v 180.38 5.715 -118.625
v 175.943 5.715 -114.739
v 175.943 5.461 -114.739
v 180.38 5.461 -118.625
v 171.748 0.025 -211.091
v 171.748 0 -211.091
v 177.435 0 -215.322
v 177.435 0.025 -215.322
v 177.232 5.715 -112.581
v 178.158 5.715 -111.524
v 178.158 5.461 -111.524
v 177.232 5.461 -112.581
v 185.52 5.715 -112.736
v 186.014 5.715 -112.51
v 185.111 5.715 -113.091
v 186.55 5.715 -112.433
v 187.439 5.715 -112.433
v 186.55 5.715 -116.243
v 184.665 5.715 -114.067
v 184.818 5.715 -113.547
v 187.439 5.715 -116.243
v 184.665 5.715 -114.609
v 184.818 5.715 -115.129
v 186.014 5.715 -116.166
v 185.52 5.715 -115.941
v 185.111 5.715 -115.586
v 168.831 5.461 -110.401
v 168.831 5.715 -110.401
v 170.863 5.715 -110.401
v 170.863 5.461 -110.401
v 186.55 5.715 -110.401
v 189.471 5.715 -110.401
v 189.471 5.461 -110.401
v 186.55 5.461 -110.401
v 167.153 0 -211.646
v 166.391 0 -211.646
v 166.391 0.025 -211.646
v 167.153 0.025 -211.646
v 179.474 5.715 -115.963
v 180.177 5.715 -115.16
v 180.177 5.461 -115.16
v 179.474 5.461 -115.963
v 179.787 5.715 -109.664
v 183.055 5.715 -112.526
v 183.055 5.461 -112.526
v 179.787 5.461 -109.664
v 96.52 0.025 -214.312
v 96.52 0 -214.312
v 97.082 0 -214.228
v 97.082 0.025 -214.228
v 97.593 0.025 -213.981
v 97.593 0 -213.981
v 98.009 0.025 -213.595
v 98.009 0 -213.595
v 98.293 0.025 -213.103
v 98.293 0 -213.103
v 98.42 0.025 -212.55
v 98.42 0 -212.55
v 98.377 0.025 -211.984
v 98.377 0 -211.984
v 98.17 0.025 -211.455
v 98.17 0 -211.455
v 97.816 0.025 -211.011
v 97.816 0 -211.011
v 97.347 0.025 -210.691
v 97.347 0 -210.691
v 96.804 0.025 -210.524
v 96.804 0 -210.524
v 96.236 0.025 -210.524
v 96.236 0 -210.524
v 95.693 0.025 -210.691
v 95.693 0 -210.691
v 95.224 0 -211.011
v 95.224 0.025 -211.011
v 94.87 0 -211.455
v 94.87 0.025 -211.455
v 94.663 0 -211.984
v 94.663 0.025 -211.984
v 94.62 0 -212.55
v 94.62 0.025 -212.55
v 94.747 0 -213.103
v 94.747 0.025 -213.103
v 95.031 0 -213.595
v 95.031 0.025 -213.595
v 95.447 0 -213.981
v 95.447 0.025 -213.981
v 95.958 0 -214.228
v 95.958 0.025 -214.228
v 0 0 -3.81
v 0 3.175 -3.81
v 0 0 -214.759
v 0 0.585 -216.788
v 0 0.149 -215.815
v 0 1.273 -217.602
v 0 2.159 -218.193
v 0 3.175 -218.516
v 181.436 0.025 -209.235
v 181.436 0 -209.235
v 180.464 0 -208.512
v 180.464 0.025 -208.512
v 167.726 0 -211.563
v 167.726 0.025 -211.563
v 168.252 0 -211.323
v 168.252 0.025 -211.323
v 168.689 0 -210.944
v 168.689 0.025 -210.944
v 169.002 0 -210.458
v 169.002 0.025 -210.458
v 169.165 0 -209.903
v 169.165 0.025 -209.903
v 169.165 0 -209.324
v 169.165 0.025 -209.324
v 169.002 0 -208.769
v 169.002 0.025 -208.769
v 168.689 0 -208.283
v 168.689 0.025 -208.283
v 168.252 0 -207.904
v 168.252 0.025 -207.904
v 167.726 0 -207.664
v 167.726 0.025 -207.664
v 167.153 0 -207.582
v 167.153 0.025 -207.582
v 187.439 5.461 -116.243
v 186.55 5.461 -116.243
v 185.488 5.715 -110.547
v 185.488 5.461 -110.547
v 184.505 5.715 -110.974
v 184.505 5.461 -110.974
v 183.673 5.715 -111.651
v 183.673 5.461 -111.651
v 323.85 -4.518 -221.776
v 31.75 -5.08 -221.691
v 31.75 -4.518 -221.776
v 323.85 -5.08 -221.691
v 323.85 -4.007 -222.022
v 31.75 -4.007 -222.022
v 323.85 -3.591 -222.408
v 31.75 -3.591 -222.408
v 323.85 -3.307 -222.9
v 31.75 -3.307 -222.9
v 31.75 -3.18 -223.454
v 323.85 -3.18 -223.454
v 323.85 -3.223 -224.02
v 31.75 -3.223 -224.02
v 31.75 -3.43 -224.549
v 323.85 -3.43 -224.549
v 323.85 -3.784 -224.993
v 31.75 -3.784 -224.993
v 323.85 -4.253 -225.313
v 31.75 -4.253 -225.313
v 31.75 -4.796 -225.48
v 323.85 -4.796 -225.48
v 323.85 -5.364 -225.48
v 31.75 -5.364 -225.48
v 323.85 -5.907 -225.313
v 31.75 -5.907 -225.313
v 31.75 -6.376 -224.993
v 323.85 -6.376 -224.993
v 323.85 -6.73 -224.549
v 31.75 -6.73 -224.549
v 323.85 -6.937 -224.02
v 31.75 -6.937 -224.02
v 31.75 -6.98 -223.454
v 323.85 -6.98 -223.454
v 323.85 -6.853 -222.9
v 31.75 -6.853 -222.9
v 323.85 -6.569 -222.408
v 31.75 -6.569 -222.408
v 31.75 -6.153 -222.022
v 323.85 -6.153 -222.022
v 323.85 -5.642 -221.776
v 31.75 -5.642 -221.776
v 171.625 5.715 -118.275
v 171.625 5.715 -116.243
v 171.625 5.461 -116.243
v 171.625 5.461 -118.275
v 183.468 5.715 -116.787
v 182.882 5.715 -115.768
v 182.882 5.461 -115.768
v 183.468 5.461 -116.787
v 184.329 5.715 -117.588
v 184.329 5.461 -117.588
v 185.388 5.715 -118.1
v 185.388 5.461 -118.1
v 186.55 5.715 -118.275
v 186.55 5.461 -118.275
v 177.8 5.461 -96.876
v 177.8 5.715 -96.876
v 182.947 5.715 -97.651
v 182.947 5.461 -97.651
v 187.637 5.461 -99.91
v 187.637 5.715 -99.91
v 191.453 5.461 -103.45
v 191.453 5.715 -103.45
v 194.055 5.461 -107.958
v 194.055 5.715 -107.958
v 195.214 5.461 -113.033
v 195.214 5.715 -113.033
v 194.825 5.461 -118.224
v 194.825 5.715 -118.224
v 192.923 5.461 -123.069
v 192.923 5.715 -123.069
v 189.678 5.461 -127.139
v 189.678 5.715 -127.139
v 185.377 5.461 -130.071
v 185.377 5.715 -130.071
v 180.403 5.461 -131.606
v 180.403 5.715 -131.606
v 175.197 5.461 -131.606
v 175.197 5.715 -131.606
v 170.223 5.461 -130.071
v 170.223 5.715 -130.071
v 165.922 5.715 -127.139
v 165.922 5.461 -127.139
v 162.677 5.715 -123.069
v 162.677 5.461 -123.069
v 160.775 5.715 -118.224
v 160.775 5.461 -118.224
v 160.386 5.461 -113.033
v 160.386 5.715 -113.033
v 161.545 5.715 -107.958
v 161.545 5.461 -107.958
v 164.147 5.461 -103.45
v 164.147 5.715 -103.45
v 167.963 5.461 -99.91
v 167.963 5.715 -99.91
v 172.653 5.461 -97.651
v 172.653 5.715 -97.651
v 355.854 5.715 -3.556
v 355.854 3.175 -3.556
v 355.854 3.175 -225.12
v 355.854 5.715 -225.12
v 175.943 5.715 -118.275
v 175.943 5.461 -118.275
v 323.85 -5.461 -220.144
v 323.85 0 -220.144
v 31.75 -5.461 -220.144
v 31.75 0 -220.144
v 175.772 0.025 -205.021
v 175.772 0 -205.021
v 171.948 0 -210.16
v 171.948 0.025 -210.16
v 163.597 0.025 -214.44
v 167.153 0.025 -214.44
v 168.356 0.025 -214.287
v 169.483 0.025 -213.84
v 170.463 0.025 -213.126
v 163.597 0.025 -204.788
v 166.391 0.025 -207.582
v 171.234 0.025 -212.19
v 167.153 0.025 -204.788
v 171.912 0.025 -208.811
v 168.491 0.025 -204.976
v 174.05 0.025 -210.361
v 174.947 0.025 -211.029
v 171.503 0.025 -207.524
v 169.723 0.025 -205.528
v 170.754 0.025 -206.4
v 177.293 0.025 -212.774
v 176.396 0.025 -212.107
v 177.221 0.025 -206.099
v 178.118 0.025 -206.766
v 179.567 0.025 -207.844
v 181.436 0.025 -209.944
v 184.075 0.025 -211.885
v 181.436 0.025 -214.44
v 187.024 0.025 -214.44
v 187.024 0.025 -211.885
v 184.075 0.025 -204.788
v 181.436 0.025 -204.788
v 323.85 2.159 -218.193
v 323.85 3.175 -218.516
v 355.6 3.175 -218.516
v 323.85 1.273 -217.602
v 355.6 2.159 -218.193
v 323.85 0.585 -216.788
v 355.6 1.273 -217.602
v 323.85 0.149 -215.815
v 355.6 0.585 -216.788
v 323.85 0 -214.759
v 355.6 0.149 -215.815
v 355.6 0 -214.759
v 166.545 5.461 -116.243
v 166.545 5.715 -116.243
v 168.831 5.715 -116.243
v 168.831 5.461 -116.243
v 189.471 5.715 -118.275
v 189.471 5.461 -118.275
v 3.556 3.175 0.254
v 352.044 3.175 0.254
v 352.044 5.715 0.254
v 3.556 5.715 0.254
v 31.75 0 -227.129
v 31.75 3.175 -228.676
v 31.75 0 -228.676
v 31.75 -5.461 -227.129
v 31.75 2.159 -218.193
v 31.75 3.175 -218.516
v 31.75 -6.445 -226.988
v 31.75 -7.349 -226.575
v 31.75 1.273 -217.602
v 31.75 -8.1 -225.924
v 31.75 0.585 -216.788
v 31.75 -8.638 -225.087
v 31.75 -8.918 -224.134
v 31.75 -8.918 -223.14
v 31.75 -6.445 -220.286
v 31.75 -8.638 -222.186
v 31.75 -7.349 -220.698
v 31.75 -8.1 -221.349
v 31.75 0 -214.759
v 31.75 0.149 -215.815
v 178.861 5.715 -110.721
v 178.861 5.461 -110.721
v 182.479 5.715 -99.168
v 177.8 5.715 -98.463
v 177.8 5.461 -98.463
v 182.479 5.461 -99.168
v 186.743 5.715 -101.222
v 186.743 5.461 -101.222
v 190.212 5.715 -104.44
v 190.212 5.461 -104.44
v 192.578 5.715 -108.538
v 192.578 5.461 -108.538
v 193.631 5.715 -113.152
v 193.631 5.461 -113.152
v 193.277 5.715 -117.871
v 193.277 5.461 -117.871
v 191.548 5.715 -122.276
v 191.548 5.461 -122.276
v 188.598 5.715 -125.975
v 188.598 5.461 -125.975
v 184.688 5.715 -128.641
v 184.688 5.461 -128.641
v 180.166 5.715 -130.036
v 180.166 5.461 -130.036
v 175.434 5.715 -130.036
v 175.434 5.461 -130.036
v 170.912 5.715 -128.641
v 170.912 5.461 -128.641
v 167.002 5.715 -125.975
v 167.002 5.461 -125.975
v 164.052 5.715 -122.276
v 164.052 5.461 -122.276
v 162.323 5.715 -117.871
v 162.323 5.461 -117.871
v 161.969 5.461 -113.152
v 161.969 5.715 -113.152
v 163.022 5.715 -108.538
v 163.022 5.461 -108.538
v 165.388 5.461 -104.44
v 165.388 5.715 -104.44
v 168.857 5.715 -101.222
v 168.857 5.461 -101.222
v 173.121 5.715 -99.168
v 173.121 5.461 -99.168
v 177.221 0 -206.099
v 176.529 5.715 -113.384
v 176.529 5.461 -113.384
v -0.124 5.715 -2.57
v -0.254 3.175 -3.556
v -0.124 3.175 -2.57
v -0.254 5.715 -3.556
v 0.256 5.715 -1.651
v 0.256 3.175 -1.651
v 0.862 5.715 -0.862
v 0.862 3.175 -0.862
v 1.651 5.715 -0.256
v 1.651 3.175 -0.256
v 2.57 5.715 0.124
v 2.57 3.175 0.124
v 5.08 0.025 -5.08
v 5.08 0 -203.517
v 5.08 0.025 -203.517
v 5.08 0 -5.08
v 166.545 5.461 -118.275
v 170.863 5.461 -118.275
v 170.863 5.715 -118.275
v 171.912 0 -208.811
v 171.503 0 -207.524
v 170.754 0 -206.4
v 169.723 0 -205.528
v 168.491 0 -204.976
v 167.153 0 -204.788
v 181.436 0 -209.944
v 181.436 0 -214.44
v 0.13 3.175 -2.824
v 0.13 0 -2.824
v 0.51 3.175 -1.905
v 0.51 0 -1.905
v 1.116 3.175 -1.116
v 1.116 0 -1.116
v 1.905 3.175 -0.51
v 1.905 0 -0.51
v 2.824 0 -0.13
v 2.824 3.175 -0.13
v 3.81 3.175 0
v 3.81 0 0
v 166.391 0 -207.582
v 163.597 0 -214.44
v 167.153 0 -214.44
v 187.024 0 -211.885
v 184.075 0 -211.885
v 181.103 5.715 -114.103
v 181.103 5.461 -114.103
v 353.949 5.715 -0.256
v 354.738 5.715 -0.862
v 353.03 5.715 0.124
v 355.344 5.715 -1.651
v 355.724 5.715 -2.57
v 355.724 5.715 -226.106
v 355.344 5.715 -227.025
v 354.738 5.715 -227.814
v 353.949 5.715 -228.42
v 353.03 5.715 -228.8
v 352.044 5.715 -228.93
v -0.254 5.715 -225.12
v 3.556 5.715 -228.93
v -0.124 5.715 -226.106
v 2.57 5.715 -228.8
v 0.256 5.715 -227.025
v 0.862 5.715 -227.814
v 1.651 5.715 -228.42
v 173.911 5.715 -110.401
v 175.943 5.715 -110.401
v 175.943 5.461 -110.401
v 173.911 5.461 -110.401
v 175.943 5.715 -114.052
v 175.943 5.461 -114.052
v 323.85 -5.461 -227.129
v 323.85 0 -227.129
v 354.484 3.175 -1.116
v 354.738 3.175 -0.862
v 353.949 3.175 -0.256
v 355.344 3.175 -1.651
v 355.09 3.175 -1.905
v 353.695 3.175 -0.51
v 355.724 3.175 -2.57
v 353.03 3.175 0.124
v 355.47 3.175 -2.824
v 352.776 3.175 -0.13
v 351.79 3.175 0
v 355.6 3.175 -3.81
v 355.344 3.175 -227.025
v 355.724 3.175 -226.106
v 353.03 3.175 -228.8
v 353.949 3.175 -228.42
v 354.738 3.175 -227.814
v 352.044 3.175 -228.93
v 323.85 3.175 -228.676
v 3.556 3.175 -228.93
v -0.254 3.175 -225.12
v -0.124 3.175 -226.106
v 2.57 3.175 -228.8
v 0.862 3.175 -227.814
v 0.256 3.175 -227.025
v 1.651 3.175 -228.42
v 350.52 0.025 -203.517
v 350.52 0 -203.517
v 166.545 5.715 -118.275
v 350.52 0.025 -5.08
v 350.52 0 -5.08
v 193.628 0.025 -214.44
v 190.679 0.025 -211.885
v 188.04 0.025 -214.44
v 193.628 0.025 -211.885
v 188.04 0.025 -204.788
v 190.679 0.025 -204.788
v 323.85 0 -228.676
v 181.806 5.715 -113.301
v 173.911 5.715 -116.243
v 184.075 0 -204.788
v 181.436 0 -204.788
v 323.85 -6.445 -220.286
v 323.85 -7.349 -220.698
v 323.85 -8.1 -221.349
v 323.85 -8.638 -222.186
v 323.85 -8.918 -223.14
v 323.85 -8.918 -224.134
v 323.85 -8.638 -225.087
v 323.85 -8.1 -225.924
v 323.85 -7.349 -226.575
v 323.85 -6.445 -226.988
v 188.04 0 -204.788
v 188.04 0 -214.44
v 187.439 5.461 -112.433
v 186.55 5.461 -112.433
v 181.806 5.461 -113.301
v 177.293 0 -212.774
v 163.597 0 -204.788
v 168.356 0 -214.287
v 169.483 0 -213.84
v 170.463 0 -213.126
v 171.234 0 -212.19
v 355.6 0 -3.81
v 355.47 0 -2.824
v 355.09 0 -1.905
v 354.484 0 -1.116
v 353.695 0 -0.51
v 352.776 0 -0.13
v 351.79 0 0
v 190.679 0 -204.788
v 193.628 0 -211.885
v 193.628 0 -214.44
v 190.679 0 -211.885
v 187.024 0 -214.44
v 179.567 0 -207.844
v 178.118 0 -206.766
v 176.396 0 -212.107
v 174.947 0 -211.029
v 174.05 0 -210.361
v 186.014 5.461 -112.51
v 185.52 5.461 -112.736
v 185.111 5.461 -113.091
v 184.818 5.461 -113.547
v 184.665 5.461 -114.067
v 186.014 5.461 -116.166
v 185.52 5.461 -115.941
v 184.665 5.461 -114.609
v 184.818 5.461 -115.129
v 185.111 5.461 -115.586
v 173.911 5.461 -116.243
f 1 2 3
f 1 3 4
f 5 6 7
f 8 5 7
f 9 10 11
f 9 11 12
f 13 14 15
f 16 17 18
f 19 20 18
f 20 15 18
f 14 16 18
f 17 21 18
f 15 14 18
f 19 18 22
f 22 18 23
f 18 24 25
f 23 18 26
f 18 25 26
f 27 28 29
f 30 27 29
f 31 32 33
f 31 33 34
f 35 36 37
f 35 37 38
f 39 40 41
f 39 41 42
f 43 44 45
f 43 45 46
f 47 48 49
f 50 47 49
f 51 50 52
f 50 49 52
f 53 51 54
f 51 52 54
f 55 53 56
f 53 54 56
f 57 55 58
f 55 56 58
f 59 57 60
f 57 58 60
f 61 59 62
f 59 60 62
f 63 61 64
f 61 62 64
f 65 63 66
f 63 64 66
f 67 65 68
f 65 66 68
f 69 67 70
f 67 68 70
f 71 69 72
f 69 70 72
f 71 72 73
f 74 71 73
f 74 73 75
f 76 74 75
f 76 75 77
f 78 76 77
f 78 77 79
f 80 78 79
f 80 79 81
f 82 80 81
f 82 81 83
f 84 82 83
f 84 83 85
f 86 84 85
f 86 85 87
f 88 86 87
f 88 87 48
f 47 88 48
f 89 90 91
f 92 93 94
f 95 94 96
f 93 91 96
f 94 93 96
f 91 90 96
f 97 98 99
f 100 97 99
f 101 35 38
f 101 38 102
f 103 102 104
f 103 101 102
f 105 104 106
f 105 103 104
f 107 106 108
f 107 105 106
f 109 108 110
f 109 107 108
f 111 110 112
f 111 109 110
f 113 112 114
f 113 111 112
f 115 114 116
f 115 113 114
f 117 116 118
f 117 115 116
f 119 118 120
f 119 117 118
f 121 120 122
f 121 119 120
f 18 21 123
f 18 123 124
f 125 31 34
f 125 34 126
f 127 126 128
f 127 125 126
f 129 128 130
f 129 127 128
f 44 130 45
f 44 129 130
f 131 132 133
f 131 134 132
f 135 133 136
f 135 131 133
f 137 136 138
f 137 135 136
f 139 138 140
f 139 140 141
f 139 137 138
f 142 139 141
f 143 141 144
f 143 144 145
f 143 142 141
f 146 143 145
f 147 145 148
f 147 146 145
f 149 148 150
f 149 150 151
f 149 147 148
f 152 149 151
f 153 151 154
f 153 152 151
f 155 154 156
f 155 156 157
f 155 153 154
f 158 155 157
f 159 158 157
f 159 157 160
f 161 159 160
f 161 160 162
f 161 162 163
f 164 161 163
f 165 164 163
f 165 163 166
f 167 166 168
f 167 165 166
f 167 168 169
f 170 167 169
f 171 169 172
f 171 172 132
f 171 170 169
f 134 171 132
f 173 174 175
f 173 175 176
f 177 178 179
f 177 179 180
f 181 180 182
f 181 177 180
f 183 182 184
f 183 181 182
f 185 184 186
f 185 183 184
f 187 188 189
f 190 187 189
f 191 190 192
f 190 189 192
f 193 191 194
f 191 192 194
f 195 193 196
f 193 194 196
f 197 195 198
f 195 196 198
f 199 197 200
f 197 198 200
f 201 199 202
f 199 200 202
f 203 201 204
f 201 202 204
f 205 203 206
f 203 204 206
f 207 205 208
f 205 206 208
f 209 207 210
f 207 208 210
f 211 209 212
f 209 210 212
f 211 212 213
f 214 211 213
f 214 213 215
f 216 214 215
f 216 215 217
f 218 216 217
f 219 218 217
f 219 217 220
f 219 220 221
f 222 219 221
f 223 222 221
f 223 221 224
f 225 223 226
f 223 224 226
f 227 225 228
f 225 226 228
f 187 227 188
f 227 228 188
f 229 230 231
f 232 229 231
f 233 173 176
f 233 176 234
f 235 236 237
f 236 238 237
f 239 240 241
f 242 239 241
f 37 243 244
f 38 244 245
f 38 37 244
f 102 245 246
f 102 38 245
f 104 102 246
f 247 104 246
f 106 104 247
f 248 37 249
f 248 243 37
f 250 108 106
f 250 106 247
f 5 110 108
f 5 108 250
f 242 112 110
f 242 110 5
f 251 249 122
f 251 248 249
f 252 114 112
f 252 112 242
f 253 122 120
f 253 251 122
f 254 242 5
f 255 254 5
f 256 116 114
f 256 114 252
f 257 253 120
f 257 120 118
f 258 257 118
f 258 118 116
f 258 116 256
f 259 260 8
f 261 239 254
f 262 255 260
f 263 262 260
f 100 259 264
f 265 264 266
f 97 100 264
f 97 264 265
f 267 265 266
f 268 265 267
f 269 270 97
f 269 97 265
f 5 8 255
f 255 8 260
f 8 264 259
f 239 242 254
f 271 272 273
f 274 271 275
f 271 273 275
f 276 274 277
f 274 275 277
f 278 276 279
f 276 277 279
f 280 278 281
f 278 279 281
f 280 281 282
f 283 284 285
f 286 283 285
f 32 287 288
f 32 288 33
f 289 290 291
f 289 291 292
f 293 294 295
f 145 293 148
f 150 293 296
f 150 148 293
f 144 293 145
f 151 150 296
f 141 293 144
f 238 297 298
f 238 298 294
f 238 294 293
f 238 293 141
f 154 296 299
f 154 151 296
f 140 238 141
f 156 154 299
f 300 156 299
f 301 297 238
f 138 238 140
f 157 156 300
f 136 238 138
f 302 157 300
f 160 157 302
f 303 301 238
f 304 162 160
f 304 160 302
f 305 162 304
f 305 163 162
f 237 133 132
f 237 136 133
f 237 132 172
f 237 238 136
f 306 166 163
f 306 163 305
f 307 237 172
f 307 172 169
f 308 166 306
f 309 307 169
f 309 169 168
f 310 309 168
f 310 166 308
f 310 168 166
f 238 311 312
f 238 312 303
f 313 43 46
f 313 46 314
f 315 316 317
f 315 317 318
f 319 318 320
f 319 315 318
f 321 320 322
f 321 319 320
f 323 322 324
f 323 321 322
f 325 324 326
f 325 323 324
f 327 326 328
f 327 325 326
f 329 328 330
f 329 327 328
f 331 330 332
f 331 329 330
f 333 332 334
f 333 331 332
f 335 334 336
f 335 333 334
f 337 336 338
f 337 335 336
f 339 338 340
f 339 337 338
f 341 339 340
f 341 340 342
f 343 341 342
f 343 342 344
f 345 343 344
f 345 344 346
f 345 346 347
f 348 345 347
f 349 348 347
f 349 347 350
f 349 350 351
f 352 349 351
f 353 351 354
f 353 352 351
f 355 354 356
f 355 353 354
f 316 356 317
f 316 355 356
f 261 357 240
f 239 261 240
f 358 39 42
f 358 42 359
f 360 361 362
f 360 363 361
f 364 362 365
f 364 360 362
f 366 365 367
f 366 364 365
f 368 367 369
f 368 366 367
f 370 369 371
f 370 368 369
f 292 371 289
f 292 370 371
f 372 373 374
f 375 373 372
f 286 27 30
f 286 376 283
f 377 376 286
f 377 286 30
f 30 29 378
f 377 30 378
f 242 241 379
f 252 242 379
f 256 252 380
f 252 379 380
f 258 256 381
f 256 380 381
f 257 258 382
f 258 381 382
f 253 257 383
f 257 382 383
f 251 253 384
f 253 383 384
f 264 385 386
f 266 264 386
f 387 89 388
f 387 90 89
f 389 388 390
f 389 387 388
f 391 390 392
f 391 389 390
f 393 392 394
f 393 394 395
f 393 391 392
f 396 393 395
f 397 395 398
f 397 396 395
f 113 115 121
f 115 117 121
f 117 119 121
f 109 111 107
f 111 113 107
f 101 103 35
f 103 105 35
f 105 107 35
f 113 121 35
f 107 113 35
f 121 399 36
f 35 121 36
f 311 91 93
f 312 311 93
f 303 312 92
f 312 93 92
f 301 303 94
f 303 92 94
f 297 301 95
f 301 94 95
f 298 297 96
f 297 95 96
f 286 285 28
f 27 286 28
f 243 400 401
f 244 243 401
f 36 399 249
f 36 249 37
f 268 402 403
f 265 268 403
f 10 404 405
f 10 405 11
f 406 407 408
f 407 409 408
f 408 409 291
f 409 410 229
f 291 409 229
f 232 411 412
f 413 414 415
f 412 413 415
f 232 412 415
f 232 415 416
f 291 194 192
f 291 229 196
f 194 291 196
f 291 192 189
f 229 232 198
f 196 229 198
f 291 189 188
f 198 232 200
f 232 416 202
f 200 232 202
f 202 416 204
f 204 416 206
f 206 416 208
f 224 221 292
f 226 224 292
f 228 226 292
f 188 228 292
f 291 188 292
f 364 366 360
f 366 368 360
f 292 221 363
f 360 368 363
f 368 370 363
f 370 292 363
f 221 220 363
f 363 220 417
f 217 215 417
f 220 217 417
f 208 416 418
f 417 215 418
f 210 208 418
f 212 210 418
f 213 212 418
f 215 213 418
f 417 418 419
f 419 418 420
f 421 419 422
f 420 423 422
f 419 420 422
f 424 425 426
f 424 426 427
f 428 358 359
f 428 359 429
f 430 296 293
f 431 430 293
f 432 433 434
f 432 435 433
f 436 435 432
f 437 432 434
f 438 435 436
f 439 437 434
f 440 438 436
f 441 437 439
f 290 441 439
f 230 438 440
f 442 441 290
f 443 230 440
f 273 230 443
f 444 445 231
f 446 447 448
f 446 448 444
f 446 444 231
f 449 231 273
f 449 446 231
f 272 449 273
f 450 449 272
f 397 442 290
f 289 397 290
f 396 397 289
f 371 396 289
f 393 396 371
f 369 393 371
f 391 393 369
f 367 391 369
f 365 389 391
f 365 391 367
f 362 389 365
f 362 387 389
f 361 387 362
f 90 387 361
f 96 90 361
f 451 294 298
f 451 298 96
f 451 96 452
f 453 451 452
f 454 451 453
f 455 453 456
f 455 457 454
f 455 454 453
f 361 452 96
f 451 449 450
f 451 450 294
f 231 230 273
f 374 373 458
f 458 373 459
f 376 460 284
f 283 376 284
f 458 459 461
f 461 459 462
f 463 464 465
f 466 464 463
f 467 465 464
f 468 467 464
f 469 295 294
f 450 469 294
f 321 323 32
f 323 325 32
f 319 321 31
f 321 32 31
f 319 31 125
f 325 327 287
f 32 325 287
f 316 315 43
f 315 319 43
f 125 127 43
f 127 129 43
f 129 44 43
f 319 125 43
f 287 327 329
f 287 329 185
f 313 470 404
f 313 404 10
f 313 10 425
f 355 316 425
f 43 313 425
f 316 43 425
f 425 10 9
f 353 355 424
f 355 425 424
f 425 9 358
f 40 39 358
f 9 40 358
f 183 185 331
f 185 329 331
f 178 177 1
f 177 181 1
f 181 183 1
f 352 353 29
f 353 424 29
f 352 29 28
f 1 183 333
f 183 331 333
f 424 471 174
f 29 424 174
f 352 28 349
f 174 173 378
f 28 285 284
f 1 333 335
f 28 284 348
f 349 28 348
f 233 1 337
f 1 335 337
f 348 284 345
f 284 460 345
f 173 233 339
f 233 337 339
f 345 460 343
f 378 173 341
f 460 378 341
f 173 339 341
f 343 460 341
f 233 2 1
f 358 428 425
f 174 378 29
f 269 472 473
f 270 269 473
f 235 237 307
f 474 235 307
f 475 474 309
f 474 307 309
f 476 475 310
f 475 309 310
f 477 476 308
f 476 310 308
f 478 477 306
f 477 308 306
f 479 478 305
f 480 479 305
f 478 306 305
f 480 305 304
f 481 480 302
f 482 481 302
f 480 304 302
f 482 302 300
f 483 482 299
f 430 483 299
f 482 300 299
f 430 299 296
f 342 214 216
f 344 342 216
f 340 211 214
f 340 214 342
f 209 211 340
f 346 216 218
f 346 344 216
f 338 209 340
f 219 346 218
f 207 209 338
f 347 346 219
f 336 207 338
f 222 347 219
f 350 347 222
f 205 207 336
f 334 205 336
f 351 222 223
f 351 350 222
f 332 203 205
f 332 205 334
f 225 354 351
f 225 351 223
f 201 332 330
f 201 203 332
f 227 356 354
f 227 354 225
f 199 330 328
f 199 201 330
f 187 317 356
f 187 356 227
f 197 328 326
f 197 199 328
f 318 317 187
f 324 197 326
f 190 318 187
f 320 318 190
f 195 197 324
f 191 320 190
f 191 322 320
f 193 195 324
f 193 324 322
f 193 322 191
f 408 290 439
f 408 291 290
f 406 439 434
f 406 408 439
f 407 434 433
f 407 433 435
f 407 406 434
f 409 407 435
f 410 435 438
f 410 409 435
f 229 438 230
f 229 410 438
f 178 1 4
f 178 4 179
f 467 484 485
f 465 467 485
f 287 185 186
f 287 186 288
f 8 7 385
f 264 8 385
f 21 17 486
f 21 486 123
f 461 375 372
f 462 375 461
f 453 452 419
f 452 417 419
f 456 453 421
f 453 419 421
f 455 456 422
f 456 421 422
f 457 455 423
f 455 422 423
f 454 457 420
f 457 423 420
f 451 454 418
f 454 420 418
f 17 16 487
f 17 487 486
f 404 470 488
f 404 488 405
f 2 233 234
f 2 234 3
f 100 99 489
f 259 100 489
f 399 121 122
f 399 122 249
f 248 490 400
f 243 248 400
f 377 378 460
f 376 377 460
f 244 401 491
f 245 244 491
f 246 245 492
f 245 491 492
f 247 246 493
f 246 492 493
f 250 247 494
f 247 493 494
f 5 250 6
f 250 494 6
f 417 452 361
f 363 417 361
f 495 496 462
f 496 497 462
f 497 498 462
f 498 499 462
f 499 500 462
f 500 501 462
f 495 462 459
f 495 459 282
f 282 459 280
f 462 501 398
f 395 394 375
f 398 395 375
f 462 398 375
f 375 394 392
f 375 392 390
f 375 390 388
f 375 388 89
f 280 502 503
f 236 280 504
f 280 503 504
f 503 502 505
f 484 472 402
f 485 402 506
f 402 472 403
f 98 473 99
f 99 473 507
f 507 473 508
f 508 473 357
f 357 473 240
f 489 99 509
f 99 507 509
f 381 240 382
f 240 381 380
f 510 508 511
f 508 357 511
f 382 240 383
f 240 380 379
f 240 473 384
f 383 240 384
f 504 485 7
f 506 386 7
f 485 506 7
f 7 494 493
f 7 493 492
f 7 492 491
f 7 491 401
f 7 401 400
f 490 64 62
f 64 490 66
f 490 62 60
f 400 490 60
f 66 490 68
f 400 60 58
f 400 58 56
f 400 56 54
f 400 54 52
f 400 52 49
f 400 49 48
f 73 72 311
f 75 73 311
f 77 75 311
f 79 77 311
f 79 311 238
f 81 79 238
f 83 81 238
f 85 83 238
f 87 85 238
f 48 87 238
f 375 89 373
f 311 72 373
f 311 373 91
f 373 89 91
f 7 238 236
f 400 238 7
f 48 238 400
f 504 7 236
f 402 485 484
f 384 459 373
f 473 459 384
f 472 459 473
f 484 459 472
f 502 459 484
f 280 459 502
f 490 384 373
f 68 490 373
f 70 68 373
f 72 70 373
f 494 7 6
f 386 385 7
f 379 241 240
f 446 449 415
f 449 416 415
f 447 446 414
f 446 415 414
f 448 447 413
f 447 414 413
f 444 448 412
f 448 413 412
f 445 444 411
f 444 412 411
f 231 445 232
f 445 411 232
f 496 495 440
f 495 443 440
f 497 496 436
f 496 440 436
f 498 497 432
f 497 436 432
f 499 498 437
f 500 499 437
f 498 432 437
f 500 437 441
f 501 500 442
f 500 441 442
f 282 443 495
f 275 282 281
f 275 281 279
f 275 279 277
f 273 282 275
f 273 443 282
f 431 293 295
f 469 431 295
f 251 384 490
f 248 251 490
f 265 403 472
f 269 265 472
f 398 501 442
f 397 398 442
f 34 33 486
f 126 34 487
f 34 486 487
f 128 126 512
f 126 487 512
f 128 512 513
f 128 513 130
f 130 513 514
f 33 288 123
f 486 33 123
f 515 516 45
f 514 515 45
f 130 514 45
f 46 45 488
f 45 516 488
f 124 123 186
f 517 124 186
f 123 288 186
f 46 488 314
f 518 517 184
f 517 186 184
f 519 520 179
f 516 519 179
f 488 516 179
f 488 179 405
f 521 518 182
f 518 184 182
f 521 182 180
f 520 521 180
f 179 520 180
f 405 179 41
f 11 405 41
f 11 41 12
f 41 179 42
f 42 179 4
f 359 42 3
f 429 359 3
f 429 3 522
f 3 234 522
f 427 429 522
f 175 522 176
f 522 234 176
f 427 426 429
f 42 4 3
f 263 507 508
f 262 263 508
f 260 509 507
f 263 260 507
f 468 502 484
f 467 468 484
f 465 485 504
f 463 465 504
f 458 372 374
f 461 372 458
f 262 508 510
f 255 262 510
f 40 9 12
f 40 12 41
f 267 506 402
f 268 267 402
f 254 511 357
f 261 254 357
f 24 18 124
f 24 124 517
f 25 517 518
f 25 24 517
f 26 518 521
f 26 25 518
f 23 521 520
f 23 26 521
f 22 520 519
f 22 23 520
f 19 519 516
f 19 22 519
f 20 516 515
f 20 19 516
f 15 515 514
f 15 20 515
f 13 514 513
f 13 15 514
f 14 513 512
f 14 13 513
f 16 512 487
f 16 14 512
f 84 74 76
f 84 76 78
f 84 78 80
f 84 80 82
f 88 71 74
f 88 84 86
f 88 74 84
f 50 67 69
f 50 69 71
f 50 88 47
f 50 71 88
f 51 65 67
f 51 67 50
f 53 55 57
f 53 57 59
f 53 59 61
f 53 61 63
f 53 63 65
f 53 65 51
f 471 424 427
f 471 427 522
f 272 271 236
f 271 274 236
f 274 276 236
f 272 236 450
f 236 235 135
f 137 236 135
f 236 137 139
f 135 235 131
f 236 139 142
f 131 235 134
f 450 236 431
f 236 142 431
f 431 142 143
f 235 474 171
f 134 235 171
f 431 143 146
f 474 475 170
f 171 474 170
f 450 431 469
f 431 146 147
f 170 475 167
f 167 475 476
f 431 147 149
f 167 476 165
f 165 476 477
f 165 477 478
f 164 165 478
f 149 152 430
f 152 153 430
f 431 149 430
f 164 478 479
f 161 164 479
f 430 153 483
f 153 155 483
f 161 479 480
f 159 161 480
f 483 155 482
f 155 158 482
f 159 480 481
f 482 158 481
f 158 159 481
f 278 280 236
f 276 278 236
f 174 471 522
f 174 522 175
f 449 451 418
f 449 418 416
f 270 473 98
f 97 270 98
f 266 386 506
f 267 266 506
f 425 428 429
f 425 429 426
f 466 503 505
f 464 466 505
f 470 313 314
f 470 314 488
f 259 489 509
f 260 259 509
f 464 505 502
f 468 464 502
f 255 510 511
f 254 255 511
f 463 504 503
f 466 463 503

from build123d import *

# Parameters (mm, degrees)
SKETCH1_W           = 228.6762
SKETCH1_H           = 3.175
BOSS_EXTRUDE1_DEPTH = 355.6
SKETCH2_W           = 31.75
SKETCH2_H           = 10.16
CUT_EXTRUDE1_DEPTH  = 423.793383429
SKETCH3_W           = 345.44
SKETCH3_H           = 198.4375
CUT_EXTRUDE2_DEPTH  = 2.032
SKETCH4_W           = 345.44
SKETCH4_H           = 198.4375
BOSS_EXTRUDE2_DEPTH = 2.0066
BOSS_EXTRUDE3_DEPTH = 2.54
FILLET1_R           = 3.81
SKETCH7_R           = 17.4625
SKETCH7_R_2         = 15.875
CUT_EXTRUDE3_DEPTH  = 0.254
CUT_EXTRUDE4_DEPTH  = 0.254
SKETCH9_R           = 1.905
CUT_EXTRUDE5_DEPTH  = 0.254
BOSS_EXTRUDE4_START = 0.2286
SKETCH10_R          = 1.905
BOSS_EXTRUDE4_DEPTH = 0.2286
BOSS_EXTRUDE5_START = 0.2286
BOSS_EXTRUDE5_DEPTH = 0.2286
SKETCH13_R          = 1.905
BOSS_EXTRUDE6_DEPTH = 146.05
FILLET2_R           = 3.81


with BuildPart() as part:
    # Sketch1 → Boss-Extrude1 (new body)
    with BuildSketch(Plane(origin=(0, 0, 0), x_dir=(0, 0, -1), z_dir=(1, 0, 0))):
        with Locations((114.3381, 1.5875)):
            Rectangle(SKETCH1_W, SKETCH1_H)
    extrude(amount=BOSS_EXTRUDE1_DEPTH)

    # Sketch2 → Cut-Extrude1 (cut, through all)
    with BuildSketch(Plane(origin=(0, 0, 0), x_dir=(-1, 0, 0), z_dir=(0, -1, 0))):
        with Locations((-15.875, 223.5962)):
            Rectangle(SKETCH2_W, SKETCH2_H)
        with Locations((-339.725, 223.5962)):
            Rectangle(SKETCH2_W, SKETCH2_H)
    extrude(amount=-CUT_EXTRUDE1_DEPTH, mode=Mode.SUBTRACT)

    # Sketch3 → Cut-Extrude2 (cut)
    with BuildSketch(Plane.XZ):
        with Locations((177.8, -104.29875)):
            Rectangle(SKETCH3_W, SKETCH3_H)
    extrude(amount=-CUT_EXTRUDE2_DEPTH, mode=Mode.SUBTRACT)

    # Sketch4 → Boss-Extrude2 (add)
    with BuildSketch(Plane.XZ.offset(-2.032)):
        with Locations((177.8, -104.29875)):
            Rectangle(SKETCH4_W, SKETCH4_H)
    extrude(amount=BOSS_EXTRUDE2_DEPTH)

    # Sketch6 → Boss-Extrude3 (add)
    with BuildSketch(Plane(origin=(0, 3.175, 0), x_dir=(1, 0, 0), z_dir=(0, 1, 0))):
        Polygon((-0.254, 218.5162), (-0.254, 228.9302), (355.854, 228.9302), (355.854, 218.5162), (355.854, -0.254), (-0.254, -0.254), align=None)
    extrude(amount=BOSS_EXTRUDE3_DEPTH)

    # Fillet1
    fillet1_edges = [part.edges().sort_by_distance(p)[0] for p in [
        (355.6, 1.5875, 0),
        (0, 1.5875, 0),
        (355.854, 4.445, -228.9302),
        (-0.254, 4.445, -228.9302),
        (-0.254, 4.445, 0.254),
        (355.854, 4.445, 0.254),
    ]]
    fillet(fillet1_edges, radius=FILLET1_R)

    # Sketch7 → Cut-Extrude3 (cut)
    with BuildSketch(Plane(origin=(0, 5.715, 0), x_dir=(1, 0, 0), z_dir=(0, 1, 0))):
        with Locations(Location((177.8, 114.3381, 0), (0, 0, 270))):
            Circle(SKETCH7_R)
        with Locations(Location((177.8, 114.3381, 0), (0, 0, 270))):
            Circle(SKETCH7_R_2, mode=Mode.SUBTRACT)
    extrude(amount=-CUT_EXTRUDE3_DEPTH, mode=Mode.SUBTRACT)

    # Sketch8 → Cut-Extrude4 (cut)
    # profile 1 of 2: a face of its own
    with BuildSketch(Plane(origin=(0, 5.715, 0), x_dir=(1, 0, 0), z_dir=(0, 1, 0))):
        with BuildLine():
            Line((189.471398708, 110.4011), (186.550398708, 110.4011))
            ThreePointArc((186.550398708, 110.4011), (184.504960684, 110.974151087), (183.054971216, 112.52648314))
            Line((183.054971216, 112.52648314), (179.786995785, 109.664107496))
            Line((179.786995785, 109.664107496), (178.860958774, 110.721364327))
            Line((178.860958774, 110.721364327), (181.805633989, 113.300565668))
            Line((181.805633989, 113.300565668), (181.102738426, 114.103061816))
            Line((181.102738426, 114.103061816), (178.158063211, 111.523860475))
            Line((178.158063211, 111.523860475), (177.2320262, 112.581117305))
            Line((177.2320262, 112.581117305), (180.176701415, 115.160318646))
            Line((180.176701415, 115.160318646), (179.473805853, 115.962814795))
            Line((179.473805853, 115.962814795), (176.529130638, 113.383613454))
            Line((176.529130638, 113.383613454), (175.943285209, 114.052473416))
            Line((175.943285209, 114.052473416), (175.943285209, 110.4011))
            Line((175.943285209, 110.4011), (173.911285209, 110.4011))
            Line((173.911285209, 110.4011), (173.911285209, 116.2431))
            Line((173.911285209, 116.2431), (171.625285209, 116.2431))
            Line((171.625285209, 116.2431), (171.625285209, 118.2751))
            Line((171.625285209, 118.2751), (175.943285209, 118.2751))
            Line((175.943285209, 118.2751), (175.943285209, 114.738839507))
            Line((175.943285209, 114.738839507), (180.379856415, 118.624772442))
            Line((180.379856415, 118.624772442), (182.882189217, 115.767858068))
            ThreePointArc((182.882189217, 115.767858068), (184.328798892, 117.588402025), (186.550398708, 118.2751))
            Line((186.550398708, 118.2751), (189.471398708, 118.2751))
            Line((189.471398708, 118.2751), (189.471398708, 110.4011))
        make_face()
        with BuildLine():
            Line((187.439398708, 112.4331), (187.439398708, 116.2431))
            Line((187.439398708, 116.2431), (186.550398708, 116.2431))
            ThreePointArc((186.550398708, 116.2431), (184.645398708, 114.3381), (186.550398708, 112.4331))
            Line((186.550398708, 112.4331), (187.439398708, 112.4331))
        make_face(mode=Mode.SUBTRACT)
    # profile 2 of 2: a face of its own
    with BuildSketch(Plane(origin=(0, 5.715, 0), x_dir=(1, 0, 0), z_dir=(0, 1, 0))):
        Polygon((168.831285209, 116.2431), (168.831285209, 110.4011), (170.863285209, 110.4011), (170.863285209, 118.2751), (166.545285209, 118.2751), (166.545285209, 116.2431), align=None)
    extrude(amount=-CUT_EXTRUDE4_DEPTH, mode=Mode.SUBTRACT)

    # Sketch9 → Cut-Extrude5 (cut)
    # profile 1 of 3: a face of its own
    with BuildSketch(Plane.XZ):
        with Locations(Location((96.52, -212.4075, 0), (0, 0, 270))):
            Circle(SKETCH9_R)
    # profile 2 of 3: a face of its own
    with BuildSketch(Plane.XZ):
        with BuildLine():
            Line((163.597466716, -204.7875), (163.597466716, -214.4395))
            Line((163.597466716, -214.4395), (167.153466716, -214.4395))
            ThreePointArc((167.153466716, -214.4395), (169.995954467, -213.513569152), (171.747705751, -211.091080351))
            Line((171.747705751, -211.091080351), (177.435092391, -215.322094253))
            Line((177.435092391, -215.322094253), (181.43588491, -209.94417434))
            Line((181.43588491, -209.94417434), (181.43588491, -214.4395))
            Line((181.43588491, -214.4395), (187.023578862, -214.4395))
            Line((187.023578862, -214.4395), (187.023578862, -211.885215882))
            Line((187.023578862, -211.885215882), (184.074788764, -211.885215882))
            Line((184.074788764, -211.885215882), (184.074788764, -204.7875))
            Line((184.074788764, -204.7875), (181.43588491, -204.7875))
            Line((181.43588491, -204.7875), (181.43588491, -209.234781788))
            Line((181.43588491, -209.234781788), (180.463746146, -208.51157922))
            Line((180.463746146, -208.51157922), (177.292916042, -212.773852326))
            Line((177.292916042, -212.773852326), (176.395981379, -212.106596296))
            Line((176.395981379, -212.106596296), (179.566811483, -207.84432319))
            Line((179.566811483, -207.84432319), (178.117732485, -206.766310779))
            Line((178.117732485, -206.766310779), (174.946902382, -211.028583886))
            Line((174.946902382, -211.028583886), (174.049967719, -210.361327856))
            Line((174.049967719, -210.361327856), (177.220797822, -206.099054749))
            Line((177.220797822, -206.099054749), (175.771718825, -205.021042339))
            Line((175.771718825, -205.021042339), (171.948374325, -210.160434204))
            ThreePointArc((171.948374325, -210.160434204), (170.754145851, -206.400186171), (167.153466716, -204.7875))
            Line((167.153466716, -204.7875), (163.597466716, -204.7875))
        make_face()
        with BuildLine():
            Line((166.391466716, -211.6455), (167.153466716, -211.6455))
            ThreePointArc((167.153466716, -211.6455), (169.185466716, -209.6135), (167.153466716, -207.5815))
            Line((167.153466716, -207.5815), (166.391466716, -207.5815))
            Line((166.391466716, -207.5815), (166.391466716, -211.6455))
        make_face(mode=Mode.SUBTRACT)
    # profile 3 of 3: a face of its own
    with BuildSketch(Plane.XZ):
        Polygon((190.678788764, -204.7875), (188.03988491, -204.7875), (188.03988491, -209.234781788), (188.03988491, -209.94417434), (188.03988491, -214.4395), (193.627578862, -214.4395), (193.627578862, -211.885215882), (190.678788764, -211.885215882), align=None)
    extrude(amount=-CUT_EXTRUDE5_DEPTH, mode=Mode.SUBTRACT)

    # Sketch10 → Boss-Extrude4 (add)
    with BuildSketch(Plane.XZ.offset(-0.254).offset(BOSS_EXTRUDE4_START)):
        with Locations(Location((96.52, -212.4075, 0), (0, 0, 270))):
            Circle(SKETCH10_R)
    extrude(amount=-BOSS_EXTRUDE4_DEPTH)

    # Sketch12 → Boss-Extrude5 (add)
    with BuildSketch(Plane.XZ.offset(-0.254).offset(BOSS_EXTRUDE5_START)):
        Polygon((188.03988491, -204.7875), (188.03988491, -214.4395), (193.627578862, -214.4395), (193.627578862, -211.885215882), (190.678788764, -211.885215882), (190.678788764, -204.7875), align=None)
        with BuildLine():
            Line((167.153466716, -204.7875), (163.597466716, -204.7875))
            Line((163.597466716, -204.7875), (163.597466716, -214.4395))
            Line((163.597466716, -214.4395), (167.153466716, -214.4395))
            ThreePointArc((167.153466716, -214.4395), (169.995954467, -213.513569152), (171.747705751, -211.091080351))
            Line((171.747705751, -211.091080351), (177.435092391, -215.322094253))
            Line((177.435092391, -215.322094253), (181.43588491, -209.94417434))
            Line((181.43588491, -209.94417434), (181.43588491, -214.4395))
            Line((181.43588491, -214.4395), (187.023578862, -214.4395))
            Line((187.023578862, -214.4395), (187.023578862, -211.885215882))
            Line((187.023578862, -211.885215882), (184.074788764, -211.885215882))
            Line((184.074788764, -211.885215882), (184.074788764, -204.7875))
            Line((184.074788764, -204.7875), (181.43588491, -204.7875))
            Line((181.43588491, -204.7875), (181.43588491, -209.234781788))
            Line((181.43588491, -209.234781788), (180.463746146, -208.51157922))
            Line((180.463746146, -208.51157922), (177.292916042, -212.773852326))
            Line((177.292916042, -212.773852326), (176.395981379, -212.106596296))
            Line((176.395981379, -212.106596296), (179.566811483, -207.84432319))
            Line((179.566811483, -207.84432319), (178.117732485, -206.766310779))
            Line((178.117732485, -206.766310779), (174.946902382, -211.028583886))
            Line((174.946902382, -211.028583886), (174.049967719, -210.361327856))
            Line((174.049967719, -210.361327856), (177.220797822, -206.099054749))
            Line((177.220797822, -206.099054749), (175.771718825, -205.021042339))
            Line((175.771718825, -205.021042339), (171.948374325, -210.160434204))
            ThreePointArc((171.948374325, -210.160434204), (170.754145851, -206.400186171), (167.153466716, -204.7875))
        make_face()
    extrude(amount=-BOSS_EXTRUDE5_DEPTH)

    # Sketch13 → Boss-Extrude6 (add, symmetric)
    with BuildSketch(Plane.ZY.offset(-177.8)):
        with BuildLine():
            Line((-227.129067699, -5.461), (-227.129067699, 0))
            Line((-227.129067699, 0), (-220.144067699, 0))
            Line((-220.144067699, 0), (-220.144067699, -5.461))
            ThreePointArc((-220.144067699, -5.461), (-223.636567699, -8.9535), (-227.129067699, -5.461))
        make_face()
        with Locations((-223.5962, -5.08)):
            Circle(SKETCH13_R, mode=Mode.SUBTRACT)
    extrude(amount=BOSS_EXTRUDE6_DEPTH, both=True)

    # Fillet2
    # the kernel refuses this fillet: 3.81 mm, written as the material it takes off along each edge
    with BuildSketch(Plane(origin=(364.991776656, 0, -218.5162), x_dir=(0, 1, 0), z_dir=(-1, 0, 0))) as fillet2_piece_1:
        with BuildLine():
            CenterArc((3.81, -3.756710662), FILLET2_R, 99.594068227, 80.405931773)
            Line((0, -3.756710662), (-0.0762, -3.756710662))
            Line((-0.0762, -3.756710662), (-0.0762, 0))
            Line((-0.0762, 0), (0, 0.0762))
            ThreePointArc((0, 0.0762), (1.5875, 0.0762), (3.1623, 0.075134213))
            Line((3.1623, 0.075134213), (3.175, 0))
        make_face()
    extrude(amount=41.141776656, mode=Mode.SUBTRACT)
    with BuildSketch(Plane(origin=(-9.391776656, 0, -218.5162), x_dir=(0, 1, 0), z_dir=(1, 0, 0))) as fillet2_piece_2:
        with BuildLine():
            CenterArc((3.81, 3.756710662), FILLET2_R, 180, 80.405931773)
            Line((0, 3.756710662), (-0.0762, 3.756710662))
            Line((-0.0762, 3.756710662), (-0.0762, 0))
            Line((-0.0762, 0), (0, -0.0762))
            ThreePointArc((0, -0.0762), (1.5875, -0.0762), (3.1623, -0.075134213))
            Line((3.1623, -0.075134213), (3.175, 0))
        make_face()
    extrude(amount=41.141776656, mode=Mode.SUBTRACT)


solid = part.part
